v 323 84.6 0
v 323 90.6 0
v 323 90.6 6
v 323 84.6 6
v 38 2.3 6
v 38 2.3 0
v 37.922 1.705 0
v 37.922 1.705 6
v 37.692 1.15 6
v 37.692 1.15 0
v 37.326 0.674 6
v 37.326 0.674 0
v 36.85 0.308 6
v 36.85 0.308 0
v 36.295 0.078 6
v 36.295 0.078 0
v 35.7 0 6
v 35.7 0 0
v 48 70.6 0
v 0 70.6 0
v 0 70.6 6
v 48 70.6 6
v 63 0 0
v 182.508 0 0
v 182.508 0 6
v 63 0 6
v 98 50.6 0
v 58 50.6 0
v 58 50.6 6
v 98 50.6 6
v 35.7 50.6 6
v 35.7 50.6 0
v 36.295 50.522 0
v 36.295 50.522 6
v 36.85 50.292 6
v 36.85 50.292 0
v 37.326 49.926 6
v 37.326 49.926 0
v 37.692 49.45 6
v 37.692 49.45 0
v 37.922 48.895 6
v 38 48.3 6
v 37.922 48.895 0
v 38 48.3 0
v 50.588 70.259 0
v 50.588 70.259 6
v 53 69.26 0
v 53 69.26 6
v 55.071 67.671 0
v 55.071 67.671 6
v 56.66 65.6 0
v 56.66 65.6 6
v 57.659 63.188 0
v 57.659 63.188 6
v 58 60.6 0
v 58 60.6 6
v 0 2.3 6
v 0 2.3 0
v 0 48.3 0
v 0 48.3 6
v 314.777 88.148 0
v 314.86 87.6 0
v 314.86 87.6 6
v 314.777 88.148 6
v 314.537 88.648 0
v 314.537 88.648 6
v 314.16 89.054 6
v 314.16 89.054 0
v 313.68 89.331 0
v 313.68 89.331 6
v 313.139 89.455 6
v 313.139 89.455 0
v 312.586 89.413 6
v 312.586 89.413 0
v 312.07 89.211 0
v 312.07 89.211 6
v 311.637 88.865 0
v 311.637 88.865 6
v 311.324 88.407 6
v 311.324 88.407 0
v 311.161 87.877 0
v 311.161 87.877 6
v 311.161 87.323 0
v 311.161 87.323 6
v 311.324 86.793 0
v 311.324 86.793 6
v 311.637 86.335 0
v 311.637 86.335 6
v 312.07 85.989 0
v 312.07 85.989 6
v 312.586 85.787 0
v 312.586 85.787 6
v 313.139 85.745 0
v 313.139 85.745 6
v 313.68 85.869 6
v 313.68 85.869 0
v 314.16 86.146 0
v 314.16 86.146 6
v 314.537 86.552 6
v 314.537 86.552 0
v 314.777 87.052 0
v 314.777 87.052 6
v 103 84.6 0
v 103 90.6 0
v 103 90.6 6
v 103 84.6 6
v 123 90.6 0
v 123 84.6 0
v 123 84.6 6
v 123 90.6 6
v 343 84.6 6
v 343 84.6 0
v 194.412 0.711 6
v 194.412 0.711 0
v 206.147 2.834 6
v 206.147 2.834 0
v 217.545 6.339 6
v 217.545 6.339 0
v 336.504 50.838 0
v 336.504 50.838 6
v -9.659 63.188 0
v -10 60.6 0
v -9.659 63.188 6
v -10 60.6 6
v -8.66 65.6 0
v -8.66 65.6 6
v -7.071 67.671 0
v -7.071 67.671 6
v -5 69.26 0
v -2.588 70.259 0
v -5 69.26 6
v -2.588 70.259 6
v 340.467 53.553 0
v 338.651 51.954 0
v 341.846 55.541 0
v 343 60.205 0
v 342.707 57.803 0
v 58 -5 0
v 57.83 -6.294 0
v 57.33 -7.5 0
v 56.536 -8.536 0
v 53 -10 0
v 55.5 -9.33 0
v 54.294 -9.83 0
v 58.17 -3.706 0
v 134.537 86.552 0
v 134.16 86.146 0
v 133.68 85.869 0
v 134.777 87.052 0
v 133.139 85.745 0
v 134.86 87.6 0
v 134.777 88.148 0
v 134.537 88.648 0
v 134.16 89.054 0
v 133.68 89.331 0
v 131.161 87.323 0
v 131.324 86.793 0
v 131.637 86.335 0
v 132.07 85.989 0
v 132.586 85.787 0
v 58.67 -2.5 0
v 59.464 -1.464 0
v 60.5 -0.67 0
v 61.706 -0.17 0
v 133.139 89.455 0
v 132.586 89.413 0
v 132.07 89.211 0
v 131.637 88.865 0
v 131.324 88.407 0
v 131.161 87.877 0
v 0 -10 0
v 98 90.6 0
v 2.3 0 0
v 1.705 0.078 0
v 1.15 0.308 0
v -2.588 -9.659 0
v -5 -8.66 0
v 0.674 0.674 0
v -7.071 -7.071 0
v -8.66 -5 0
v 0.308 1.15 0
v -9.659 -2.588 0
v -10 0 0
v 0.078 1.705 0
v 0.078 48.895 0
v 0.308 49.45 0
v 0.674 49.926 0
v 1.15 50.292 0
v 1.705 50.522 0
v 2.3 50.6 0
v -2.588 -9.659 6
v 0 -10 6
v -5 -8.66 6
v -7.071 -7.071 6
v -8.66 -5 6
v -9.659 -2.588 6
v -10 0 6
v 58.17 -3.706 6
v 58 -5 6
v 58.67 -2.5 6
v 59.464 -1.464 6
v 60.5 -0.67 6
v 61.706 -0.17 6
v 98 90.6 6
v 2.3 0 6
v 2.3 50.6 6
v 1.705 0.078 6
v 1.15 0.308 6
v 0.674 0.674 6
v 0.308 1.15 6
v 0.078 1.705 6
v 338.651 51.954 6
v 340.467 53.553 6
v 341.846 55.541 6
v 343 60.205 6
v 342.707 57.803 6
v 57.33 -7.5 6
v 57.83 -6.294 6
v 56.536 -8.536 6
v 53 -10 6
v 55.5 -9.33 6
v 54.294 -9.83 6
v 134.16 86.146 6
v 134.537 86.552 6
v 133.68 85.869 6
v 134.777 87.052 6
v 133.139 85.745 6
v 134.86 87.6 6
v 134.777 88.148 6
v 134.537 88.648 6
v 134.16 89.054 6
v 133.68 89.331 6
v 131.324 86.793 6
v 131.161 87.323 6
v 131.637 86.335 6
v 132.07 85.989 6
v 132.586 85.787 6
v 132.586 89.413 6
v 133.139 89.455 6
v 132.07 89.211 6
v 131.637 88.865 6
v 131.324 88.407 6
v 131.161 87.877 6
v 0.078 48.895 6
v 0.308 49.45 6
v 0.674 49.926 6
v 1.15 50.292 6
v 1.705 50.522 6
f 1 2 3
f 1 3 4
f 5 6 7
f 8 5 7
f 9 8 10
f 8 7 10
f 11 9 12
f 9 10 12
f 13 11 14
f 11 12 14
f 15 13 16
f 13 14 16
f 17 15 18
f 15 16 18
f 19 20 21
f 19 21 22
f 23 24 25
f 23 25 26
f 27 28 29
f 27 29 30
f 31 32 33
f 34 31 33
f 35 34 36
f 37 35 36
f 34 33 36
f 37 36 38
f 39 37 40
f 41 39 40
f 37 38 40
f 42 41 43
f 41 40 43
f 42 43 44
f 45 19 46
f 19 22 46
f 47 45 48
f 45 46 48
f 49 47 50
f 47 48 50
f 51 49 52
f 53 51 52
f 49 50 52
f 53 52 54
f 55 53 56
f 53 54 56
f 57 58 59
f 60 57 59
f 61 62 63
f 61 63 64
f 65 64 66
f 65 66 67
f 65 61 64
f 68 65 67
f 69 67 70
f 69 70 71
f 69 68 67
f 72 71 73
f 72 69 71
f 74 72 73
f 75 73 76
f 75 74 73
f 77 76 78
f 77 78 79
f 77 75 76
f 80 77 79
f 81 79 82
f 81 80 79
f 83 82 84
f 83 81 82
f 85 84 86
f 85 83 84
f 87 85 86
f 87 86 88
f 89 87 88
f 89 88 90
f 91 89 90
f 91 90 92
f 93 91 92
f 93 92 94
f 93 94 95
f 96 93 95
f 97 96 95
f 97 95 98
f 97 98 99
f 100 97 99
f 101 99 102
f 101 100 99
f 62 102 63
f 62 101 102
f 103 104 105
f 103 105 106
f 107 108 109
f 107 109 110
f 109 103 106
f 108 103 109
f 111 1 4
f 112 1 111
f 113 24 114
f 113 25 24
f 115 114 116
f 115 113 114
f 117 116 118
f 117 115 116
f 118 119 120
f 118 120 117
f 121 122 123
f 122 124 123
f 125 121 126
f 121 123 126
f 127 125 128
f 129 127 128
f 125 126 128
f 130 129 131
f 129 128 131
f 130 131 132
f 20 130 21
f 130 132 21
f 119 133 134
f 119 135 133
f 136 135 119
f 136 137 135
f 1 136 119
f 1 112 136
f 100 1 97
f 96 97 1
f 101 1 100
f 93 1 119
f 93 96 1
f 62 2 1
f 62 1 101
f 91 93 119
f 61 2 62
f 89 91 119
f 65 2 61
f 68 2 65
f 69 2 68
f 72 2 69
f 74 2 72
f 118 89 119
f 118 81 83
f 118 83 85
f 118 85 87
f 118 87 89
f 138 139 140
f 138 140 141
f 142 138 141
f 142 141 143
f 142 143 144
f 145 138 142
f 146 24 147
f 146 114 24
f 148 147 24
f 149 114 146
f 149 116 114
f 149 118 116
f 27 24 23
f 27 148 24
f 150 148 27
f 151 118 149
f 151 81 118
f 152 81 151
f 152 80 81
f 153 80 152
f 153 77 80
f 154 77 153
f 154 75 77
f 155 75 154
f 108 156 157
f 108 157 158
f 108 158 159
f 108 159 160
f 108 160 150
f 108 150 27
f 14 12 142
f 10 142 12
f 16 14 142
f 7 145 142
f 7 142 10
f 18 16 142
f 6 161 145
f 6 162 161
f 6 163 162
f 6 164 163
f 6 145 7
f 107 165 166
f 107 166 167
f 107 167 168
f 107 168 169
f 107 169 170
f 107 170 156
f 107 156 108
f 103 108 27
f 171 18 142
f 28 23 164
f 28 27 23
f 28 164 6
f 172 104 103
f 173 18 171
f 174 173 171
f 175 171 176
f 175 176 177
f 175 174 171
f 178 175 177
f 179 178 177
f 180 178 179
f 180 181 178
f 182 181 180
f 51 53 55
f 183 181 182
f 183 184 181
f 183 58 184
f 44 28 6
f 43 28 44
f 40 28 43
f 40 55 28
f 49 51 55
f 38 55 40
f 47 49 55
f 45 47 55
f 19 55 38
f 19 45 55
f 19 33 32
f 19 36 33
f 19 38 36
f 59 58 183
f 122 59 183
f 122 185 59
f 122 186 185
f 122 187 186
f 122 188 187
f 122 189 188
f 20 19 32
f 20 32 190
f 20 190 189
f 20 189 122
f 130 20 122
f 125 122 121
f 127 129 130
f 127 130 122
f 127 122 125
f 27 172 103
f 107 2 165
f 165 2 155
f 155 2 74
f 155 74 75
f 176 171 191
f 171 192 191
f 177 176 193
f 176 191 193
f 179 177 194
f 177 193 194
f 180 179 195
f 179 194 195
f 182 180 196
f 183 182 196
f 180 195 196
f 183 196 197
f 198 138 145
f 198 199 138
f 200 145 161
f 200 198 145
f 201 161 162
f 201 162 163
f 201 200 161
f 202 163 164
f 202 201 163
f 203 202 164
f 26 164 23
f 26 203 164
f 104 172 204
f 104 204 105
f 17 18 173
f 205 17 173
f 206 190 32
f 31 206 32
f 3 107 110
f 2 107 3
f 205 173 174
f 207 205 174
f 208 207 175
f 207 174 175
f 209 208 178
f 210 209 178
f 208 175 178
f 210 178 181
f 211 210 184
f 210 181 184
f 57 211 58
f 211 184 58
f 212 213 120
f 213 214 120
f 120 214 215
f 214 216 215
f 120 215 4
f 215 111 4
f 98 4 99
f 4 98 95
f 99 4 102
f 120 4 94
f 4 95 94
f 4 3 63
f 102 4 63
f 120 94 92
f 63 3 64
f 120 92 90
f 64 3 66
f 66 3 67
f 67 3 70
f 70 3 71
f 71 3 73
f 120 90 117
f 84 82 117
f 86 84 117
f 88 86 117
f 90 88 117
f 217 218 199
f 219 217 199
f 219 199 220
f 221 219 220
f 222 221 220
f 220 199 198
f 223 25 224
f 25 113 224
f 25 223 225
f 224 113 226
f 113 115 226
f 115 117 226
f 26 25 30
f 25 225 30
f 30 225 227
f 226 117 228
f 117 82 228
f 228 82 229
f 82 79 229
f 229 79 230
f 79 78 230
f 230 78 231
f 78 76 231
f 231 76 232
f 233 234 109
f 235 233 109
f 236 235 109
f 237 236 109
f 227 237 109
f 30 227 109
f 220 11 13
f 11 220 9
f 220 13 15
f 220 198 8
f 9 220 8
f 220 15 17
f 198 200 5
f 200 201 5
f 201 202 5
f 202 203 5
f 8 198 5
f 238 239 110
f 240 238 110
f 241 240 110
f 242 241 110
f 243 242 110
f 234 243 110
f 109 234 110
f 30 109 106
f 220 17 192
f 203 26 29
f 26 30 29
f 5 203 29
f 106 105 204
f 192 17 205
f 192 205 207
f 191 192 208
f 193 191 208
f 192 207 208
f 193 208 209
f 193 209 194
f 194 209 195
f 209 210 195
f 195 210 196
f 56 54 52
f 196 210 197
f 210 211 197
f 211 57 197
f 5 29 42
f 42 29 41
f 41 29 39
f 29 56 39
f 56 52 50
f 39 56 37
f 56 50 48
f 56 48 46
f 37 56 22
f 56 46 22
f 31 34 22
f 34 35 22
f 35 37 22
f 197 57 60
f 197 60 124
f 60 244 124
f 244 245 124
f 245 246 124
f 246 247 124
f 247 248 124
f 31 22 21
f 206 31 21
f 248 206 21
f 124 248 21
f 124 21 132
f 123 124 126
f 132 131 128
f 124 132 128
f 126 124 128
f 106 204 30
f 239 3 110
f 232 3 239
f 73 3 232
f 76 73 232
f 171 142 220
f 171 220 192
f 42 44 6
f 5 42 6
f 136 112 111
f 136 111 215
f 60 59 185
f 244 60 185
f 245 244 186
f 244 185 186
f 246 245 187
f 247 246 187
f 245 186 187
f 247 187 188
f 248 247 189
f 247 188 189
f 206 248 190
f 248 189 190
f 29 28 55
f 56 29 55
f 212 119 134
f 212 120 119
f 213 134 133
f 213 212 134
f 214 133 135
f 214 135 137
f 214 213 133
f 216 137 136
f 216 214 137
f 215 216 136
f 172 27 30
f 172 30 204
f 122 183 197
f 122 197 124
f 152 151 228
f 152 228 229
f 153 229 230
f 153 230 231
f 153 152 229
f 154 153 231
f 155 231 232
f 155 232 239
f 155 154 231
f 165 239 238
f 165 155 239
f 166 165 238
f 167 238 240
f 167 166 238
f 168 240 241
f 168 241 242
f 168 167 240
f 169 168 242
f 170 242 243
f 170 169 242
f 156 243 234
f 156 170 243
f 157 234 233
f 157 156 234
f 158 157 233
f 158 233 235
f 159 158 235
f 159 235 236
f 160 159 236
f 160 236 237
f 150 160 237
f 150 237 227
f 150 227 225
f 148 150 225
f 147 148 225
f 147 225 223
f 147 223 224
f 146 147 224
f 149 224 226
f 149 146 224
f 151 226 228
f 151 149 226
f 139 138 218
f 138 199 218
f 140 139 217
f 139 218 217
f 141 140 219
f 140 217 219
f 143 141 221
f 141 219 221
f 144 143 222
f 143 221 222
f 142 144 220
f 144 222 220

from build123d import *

# Parameters (mm, degrees)
SKETCH1_R      = 1.86
EXTRUDE1_DEPTH = 6
FILLET1_R      = 10
FILLET2_R      = 5
FILLET4_R      = 100


with BuildPart() as part:
    # Sketch1 → Extrude1 (new body)
    with BuildSketch(Plane.XY):
        Polygon((58, 0), (58, -10), (-10, -10), (-10, 70.6), (58, 70.6), (58, 58.440884087), (58, 50.6), (98, 50.6), (98, 90.6), (103, 90.6), (103, 84.6), (123, 84.6), (123, 90.6), (323, 90.6), (323, 84.6), (343, 84.6), (343, 53.268621992), (200.6, 0), align=None)
        with Locations((313, 87.6)):
            Circle(SKETCH1_R, mode=Mode.SUBTRACT)
        with Locations((133, 87.6)):
            Circle(SKETCH1_R, mode=Mode.SUBTRACT)
        with BuildLine():
            Line((2.3, 50.6), (35.7, 50.6))
            ThreePointArc((35.7, 50.6), (37.326345597, 49.926345597), (38, 48.3))
            Line((38, 48.3), (38, 2.3))
            ThreePointArc((38, 2.3), (37.326345597, 0.673654403), (35.7, 0))
            Line((35.7, 0), (2.3, 0))
            ThreePointArc((2.3, 0), (0.673654403, 0.673654403), (0, 2.3))
            Line((0, 2.3), (0, 48.3))
            ThreePointArc((0, 48.3), (0.673654403, 49.926345597), (2.3, 50.6))
        make_face(mode=Mode.SUBTRACT)
    extrude(amount=EXTRUDE1_DEPTH)

    # Fillet1
    fillet1_edges = [part.edges().sort_by_distance(p)[0] for p in [
        (343, 53.268621992, 3),
        (-10, -10, 3),
        (-10, 70.6, 3),
        (58, 70.6, 3),
    ]]
    fillet(fillet1_edges, radius=FILLET1_R)

    # Fillet2
    fillet2_edges = [part.edges().sort_by_distance(p)[0] for p in [
        (58, 0, 3),
    ]]
    fillet(fillet2_edges, radius=FILLET2_R)
    fillet2_2_edges = [part.edges().sort_by_distance(p)[0] for p in [
        (58, -10, 3),
    ]]
    fillet(fillet2_2_edges, radius=FILLET2_R - 0.0001)  # a hair under: the kernel refuses the full size

    # Fillet4
    fillet4_edges = [part.edges().sort_by_distance(p)[0] for p in [
        (200.6, 0, 3),
    ]]
    fillet(fillet4_edges, radius=FILLET4_R)


solid = part.part
